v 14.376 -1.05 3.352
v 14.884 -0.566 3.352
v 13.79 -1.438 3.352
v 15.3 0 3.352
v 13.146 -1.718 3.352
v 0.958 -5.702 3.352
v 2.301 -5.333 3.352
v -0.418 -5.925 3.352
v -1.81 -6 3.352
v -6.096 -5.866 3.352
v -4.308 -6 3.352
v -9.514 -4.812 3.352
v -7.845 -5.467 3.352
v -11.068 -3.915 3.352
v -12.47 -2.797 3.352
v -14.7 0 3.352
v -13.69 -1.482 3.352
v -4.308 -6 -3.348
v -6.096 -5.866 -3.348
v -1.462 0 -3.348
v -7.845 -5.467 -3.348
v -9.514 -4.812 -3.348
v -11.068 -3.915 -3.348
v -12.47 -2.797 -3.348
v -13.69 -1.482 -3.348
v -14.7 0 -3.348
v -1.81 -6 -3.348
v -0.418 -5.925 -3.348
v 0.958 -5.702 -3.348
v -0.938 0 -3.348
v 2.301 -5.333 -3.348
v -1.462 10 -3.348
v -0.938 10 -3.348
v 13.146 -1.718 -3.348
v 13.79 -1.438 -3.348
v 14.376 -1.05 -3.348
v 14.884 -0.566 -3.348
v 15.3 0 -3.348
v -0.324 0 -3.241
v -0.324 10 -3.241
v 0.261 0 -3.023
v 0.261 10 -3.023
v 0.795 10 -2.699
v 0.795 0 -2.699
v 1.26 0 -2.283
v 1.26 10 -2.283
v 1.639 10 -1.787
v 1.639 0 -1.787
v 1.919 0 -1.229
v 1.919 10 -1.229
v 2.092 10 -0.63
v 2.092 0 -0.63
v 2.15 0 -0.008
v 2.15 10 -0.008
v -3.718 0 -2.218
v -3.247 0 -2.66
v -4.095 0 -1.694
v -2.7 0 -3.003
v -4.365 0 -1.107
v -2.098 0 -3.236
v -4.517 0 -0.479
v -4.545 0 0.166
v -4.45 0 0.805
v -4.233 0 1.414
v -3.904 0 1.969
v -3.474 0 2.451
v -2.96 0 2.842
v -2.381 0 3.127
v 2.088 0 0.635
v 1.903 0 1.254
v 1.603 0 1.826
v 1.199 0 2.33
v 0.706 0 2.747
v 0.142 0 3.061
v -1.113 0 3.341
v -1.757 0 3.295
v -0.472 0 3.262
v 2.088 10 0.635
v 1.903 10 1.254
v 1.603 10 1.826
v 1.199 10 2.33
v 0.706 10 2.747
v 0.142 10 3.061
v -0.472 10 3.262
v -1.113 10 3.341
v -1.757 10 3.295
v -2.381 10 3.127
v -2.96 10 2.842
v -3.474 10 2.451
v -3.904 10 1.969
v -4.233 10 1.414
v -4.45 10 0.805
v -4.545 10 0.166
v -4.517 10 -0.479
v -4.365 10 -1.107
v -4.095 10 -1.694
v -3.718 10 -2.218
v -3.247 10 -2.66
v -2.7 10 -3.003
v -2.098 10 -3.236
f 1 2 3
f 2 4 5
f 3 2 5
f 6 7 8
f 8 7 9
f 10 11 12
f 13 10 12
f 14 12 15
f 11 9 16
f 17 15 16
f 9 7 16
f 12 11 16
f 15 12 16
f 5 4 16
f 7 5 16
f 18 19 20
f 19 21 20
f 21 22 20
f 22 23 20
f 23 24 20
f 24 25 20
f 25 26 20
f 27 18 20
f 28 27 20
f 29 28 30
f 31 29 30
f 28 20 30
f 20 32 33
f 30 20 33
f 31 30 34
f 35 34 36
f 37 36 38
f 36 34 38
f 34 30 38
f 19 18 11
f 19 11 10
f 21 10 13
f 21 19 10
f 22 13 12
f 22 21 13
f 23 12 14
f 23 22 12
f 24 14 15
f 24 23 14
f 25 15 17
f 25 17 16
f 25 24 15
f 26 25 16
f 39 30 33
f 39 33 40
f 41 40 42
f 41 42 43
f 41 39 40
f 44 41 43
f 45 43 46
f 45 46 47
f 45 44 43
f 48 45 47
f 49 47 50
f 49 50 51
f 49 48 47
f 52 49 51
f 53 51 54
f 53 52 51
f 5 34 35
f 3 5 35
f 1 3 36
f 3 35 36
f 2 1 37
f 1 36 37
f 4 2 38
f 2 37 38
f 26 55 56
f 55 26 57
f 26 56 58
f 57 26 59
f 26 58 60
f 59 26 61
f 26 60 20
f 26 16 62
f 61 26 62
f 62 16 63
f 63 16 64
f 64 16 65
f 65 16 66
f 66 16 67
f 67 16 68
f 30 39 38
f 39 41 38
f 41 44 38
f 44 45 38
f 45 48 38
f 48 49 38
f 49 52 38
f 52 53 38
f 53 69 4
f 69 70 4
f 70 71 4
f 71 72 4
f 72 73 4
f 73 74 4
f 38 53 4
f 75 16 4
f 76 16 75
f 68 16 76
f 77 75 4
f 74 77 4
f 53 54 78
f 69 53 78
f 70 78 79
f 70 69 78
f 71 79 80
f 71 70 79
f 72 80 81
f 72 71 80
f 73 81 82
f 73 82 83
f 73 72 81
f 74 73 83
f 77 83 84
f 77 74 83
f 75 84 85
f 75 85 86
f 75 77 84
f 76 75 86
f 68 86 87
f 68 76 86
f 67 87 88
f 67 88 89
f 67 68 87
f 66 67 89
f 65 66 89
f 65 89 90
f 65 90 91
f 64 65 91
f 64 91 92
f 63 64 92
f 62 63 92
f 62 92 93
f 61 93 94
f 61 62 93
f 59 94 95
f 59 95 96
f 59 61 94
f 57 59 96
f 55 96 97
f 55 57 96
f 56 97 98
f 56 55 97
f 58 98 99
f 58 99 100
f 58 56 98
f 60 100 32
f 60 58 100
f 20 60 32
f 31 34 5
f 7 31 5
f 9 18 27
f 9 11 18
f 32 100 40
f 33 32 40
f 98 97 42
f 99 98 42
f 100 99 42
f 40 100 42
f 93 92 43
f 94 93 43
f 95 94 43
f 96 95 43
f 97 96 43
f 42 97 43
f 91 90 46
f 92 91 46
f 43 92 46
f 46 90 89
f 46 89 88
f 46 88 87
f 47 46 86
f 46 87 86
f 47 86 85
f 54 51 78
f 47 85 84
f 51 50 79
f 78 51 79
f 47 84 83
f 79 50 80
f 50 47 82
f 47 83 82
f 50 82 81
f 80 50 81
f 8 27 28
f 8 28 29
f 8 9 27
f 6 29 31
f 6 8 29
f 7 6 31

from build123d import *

# Parameters (mm, degrees)
F1_DEPTH    = 10
F2_DEPTH    = 6
F3_SIZE2    = 15
F3_SIZE     = 5
F4_T1_DEPTH = 58.6615242271
F5_R        = 13
F6_T1_DEPTH = 18.0508625467


# Not quite as in the source:
# - a fillet or chamfer that OpenCascade refuses, or shapes differently, is made with other operations: its cross-section is extruded or revolved along the edge and cut away or added


with BuildPart() as f1:
    # F0 (on Front) → F1 (new body)
    with BuildSketch(Plane.XZ):
        with BuildLine():
            ThreePointArc((2.15, -0.0081778196), (-3.4744734584, 2.4513486566), (-1.4615047685, -3.3479555451))
            Line((-1.4615047685, -3.3479555451), (-0.9384952315, -3.3479555451))
            ThreePointArc((-0.9384952315, -3.3479555451), (1.2595264762, -2.2826512779), (2.15, -0.0081778196))
        make_face()
    extrude(amount=-F1_DEPTH)

    # F0 (on Front) → F2 (join)
    with BuildSketch(Plane.XZ):
        with BuildLine():
            Line((15.3, 3.3520444549), (-14.7, 3.3520444549))
            Line((-14.7, 3.3520444549), (-14.7, -3.3479555451))
            Line((-14.7, -3.3479555451), (-1.4615047685, -3.3479555451))
            ThreePointArc((-1.4615047685, -3.3479555451), (-3.4744734584, 2.4513486566), (2.15, -0.0081778196))
            ThreePointArc((2.15, -0.0081778196), (1.2595264762, -2.2826512779), (-0.9384952315, -3.3479555451))
            Line((-0.9384952315, -3.3479555451), (15.3, -3.3479555451))
            Line((15.3, -3.3479555451), (15.3, 3.3520444549))
        make_face()
        with BuildLine():
            ThreePointArc((2.15, -0.0081778196), (-3.4744734584, 2.4513486566), (-1.4615047685, -3.3479555451))
            Line((-1.4615047685, -3.3479555451), (-0.9384952315, -3.3479555451))
            ThreePointArc((-0.9384952315, -3.3479555451), (1.2595264762, -2.2826512779), (2.15, -0.0081778196))
        make_face()
    extrude(amount=F2_DEPTH)

    # F3
    f3_edges = [f1.edges().sort_by_distance(p)[0] for p in [
        (15.3, -6, 0.002044),
    ]]
    f3_side = f1.faces().sort_by_distance((15.3, -3, 0.002044))[0]
    chamfer(f3_edges, length=F3_SIZE, length2=F3_SIZE2, reference=f3_side)

    # F4: fillet of radius 12 on 1 edges, made by hand

    # F4_s2 → F4_t1 (cut)
    with BuildSketch(Plane.XY.offset(-29.3287176586)):
        with BuildLine():
            ThreePointArc((-4.3076951546, -6), (-10.3076951546, -4.3923048454), (-14.7, 0))
            Line((-14.7, 0), (-14.7, -6))
            Line((-14.7, -6), (-4.3076951546, -6))
        make_face()
    extrude(amount=F4_T1_DEPTH, mode=Mode.SUBTRACT)

    # F5
    f5_edges = [f1.edges().sort_by_distance(p)[0] for p in [
        (0.3, -6, 0.002044),
    ]]
    fillet(f5_edges, radius=F5_R)

    # F6: fillet of radius 4 on 1 edges, made by hand

    # F6_s2 → F6_t1 (cut)
    with BuildSketch(Plane.XY.offset(-9.0233868185)):
        with BuildLine():
            ThreePointArc((13.1463252567, -1.7178915811), (14.3757224349, -1.0502059409), (15.3, 0))
            Line((15.3, 0), (15.3, -1))
            Line((15.3, -1), (13.1463252567, -1.7178915811))
        make_face()
    extrude(amount=F6_T1_DEPTH, mode=Mode.SUBTRACT)


solid = f1.part
